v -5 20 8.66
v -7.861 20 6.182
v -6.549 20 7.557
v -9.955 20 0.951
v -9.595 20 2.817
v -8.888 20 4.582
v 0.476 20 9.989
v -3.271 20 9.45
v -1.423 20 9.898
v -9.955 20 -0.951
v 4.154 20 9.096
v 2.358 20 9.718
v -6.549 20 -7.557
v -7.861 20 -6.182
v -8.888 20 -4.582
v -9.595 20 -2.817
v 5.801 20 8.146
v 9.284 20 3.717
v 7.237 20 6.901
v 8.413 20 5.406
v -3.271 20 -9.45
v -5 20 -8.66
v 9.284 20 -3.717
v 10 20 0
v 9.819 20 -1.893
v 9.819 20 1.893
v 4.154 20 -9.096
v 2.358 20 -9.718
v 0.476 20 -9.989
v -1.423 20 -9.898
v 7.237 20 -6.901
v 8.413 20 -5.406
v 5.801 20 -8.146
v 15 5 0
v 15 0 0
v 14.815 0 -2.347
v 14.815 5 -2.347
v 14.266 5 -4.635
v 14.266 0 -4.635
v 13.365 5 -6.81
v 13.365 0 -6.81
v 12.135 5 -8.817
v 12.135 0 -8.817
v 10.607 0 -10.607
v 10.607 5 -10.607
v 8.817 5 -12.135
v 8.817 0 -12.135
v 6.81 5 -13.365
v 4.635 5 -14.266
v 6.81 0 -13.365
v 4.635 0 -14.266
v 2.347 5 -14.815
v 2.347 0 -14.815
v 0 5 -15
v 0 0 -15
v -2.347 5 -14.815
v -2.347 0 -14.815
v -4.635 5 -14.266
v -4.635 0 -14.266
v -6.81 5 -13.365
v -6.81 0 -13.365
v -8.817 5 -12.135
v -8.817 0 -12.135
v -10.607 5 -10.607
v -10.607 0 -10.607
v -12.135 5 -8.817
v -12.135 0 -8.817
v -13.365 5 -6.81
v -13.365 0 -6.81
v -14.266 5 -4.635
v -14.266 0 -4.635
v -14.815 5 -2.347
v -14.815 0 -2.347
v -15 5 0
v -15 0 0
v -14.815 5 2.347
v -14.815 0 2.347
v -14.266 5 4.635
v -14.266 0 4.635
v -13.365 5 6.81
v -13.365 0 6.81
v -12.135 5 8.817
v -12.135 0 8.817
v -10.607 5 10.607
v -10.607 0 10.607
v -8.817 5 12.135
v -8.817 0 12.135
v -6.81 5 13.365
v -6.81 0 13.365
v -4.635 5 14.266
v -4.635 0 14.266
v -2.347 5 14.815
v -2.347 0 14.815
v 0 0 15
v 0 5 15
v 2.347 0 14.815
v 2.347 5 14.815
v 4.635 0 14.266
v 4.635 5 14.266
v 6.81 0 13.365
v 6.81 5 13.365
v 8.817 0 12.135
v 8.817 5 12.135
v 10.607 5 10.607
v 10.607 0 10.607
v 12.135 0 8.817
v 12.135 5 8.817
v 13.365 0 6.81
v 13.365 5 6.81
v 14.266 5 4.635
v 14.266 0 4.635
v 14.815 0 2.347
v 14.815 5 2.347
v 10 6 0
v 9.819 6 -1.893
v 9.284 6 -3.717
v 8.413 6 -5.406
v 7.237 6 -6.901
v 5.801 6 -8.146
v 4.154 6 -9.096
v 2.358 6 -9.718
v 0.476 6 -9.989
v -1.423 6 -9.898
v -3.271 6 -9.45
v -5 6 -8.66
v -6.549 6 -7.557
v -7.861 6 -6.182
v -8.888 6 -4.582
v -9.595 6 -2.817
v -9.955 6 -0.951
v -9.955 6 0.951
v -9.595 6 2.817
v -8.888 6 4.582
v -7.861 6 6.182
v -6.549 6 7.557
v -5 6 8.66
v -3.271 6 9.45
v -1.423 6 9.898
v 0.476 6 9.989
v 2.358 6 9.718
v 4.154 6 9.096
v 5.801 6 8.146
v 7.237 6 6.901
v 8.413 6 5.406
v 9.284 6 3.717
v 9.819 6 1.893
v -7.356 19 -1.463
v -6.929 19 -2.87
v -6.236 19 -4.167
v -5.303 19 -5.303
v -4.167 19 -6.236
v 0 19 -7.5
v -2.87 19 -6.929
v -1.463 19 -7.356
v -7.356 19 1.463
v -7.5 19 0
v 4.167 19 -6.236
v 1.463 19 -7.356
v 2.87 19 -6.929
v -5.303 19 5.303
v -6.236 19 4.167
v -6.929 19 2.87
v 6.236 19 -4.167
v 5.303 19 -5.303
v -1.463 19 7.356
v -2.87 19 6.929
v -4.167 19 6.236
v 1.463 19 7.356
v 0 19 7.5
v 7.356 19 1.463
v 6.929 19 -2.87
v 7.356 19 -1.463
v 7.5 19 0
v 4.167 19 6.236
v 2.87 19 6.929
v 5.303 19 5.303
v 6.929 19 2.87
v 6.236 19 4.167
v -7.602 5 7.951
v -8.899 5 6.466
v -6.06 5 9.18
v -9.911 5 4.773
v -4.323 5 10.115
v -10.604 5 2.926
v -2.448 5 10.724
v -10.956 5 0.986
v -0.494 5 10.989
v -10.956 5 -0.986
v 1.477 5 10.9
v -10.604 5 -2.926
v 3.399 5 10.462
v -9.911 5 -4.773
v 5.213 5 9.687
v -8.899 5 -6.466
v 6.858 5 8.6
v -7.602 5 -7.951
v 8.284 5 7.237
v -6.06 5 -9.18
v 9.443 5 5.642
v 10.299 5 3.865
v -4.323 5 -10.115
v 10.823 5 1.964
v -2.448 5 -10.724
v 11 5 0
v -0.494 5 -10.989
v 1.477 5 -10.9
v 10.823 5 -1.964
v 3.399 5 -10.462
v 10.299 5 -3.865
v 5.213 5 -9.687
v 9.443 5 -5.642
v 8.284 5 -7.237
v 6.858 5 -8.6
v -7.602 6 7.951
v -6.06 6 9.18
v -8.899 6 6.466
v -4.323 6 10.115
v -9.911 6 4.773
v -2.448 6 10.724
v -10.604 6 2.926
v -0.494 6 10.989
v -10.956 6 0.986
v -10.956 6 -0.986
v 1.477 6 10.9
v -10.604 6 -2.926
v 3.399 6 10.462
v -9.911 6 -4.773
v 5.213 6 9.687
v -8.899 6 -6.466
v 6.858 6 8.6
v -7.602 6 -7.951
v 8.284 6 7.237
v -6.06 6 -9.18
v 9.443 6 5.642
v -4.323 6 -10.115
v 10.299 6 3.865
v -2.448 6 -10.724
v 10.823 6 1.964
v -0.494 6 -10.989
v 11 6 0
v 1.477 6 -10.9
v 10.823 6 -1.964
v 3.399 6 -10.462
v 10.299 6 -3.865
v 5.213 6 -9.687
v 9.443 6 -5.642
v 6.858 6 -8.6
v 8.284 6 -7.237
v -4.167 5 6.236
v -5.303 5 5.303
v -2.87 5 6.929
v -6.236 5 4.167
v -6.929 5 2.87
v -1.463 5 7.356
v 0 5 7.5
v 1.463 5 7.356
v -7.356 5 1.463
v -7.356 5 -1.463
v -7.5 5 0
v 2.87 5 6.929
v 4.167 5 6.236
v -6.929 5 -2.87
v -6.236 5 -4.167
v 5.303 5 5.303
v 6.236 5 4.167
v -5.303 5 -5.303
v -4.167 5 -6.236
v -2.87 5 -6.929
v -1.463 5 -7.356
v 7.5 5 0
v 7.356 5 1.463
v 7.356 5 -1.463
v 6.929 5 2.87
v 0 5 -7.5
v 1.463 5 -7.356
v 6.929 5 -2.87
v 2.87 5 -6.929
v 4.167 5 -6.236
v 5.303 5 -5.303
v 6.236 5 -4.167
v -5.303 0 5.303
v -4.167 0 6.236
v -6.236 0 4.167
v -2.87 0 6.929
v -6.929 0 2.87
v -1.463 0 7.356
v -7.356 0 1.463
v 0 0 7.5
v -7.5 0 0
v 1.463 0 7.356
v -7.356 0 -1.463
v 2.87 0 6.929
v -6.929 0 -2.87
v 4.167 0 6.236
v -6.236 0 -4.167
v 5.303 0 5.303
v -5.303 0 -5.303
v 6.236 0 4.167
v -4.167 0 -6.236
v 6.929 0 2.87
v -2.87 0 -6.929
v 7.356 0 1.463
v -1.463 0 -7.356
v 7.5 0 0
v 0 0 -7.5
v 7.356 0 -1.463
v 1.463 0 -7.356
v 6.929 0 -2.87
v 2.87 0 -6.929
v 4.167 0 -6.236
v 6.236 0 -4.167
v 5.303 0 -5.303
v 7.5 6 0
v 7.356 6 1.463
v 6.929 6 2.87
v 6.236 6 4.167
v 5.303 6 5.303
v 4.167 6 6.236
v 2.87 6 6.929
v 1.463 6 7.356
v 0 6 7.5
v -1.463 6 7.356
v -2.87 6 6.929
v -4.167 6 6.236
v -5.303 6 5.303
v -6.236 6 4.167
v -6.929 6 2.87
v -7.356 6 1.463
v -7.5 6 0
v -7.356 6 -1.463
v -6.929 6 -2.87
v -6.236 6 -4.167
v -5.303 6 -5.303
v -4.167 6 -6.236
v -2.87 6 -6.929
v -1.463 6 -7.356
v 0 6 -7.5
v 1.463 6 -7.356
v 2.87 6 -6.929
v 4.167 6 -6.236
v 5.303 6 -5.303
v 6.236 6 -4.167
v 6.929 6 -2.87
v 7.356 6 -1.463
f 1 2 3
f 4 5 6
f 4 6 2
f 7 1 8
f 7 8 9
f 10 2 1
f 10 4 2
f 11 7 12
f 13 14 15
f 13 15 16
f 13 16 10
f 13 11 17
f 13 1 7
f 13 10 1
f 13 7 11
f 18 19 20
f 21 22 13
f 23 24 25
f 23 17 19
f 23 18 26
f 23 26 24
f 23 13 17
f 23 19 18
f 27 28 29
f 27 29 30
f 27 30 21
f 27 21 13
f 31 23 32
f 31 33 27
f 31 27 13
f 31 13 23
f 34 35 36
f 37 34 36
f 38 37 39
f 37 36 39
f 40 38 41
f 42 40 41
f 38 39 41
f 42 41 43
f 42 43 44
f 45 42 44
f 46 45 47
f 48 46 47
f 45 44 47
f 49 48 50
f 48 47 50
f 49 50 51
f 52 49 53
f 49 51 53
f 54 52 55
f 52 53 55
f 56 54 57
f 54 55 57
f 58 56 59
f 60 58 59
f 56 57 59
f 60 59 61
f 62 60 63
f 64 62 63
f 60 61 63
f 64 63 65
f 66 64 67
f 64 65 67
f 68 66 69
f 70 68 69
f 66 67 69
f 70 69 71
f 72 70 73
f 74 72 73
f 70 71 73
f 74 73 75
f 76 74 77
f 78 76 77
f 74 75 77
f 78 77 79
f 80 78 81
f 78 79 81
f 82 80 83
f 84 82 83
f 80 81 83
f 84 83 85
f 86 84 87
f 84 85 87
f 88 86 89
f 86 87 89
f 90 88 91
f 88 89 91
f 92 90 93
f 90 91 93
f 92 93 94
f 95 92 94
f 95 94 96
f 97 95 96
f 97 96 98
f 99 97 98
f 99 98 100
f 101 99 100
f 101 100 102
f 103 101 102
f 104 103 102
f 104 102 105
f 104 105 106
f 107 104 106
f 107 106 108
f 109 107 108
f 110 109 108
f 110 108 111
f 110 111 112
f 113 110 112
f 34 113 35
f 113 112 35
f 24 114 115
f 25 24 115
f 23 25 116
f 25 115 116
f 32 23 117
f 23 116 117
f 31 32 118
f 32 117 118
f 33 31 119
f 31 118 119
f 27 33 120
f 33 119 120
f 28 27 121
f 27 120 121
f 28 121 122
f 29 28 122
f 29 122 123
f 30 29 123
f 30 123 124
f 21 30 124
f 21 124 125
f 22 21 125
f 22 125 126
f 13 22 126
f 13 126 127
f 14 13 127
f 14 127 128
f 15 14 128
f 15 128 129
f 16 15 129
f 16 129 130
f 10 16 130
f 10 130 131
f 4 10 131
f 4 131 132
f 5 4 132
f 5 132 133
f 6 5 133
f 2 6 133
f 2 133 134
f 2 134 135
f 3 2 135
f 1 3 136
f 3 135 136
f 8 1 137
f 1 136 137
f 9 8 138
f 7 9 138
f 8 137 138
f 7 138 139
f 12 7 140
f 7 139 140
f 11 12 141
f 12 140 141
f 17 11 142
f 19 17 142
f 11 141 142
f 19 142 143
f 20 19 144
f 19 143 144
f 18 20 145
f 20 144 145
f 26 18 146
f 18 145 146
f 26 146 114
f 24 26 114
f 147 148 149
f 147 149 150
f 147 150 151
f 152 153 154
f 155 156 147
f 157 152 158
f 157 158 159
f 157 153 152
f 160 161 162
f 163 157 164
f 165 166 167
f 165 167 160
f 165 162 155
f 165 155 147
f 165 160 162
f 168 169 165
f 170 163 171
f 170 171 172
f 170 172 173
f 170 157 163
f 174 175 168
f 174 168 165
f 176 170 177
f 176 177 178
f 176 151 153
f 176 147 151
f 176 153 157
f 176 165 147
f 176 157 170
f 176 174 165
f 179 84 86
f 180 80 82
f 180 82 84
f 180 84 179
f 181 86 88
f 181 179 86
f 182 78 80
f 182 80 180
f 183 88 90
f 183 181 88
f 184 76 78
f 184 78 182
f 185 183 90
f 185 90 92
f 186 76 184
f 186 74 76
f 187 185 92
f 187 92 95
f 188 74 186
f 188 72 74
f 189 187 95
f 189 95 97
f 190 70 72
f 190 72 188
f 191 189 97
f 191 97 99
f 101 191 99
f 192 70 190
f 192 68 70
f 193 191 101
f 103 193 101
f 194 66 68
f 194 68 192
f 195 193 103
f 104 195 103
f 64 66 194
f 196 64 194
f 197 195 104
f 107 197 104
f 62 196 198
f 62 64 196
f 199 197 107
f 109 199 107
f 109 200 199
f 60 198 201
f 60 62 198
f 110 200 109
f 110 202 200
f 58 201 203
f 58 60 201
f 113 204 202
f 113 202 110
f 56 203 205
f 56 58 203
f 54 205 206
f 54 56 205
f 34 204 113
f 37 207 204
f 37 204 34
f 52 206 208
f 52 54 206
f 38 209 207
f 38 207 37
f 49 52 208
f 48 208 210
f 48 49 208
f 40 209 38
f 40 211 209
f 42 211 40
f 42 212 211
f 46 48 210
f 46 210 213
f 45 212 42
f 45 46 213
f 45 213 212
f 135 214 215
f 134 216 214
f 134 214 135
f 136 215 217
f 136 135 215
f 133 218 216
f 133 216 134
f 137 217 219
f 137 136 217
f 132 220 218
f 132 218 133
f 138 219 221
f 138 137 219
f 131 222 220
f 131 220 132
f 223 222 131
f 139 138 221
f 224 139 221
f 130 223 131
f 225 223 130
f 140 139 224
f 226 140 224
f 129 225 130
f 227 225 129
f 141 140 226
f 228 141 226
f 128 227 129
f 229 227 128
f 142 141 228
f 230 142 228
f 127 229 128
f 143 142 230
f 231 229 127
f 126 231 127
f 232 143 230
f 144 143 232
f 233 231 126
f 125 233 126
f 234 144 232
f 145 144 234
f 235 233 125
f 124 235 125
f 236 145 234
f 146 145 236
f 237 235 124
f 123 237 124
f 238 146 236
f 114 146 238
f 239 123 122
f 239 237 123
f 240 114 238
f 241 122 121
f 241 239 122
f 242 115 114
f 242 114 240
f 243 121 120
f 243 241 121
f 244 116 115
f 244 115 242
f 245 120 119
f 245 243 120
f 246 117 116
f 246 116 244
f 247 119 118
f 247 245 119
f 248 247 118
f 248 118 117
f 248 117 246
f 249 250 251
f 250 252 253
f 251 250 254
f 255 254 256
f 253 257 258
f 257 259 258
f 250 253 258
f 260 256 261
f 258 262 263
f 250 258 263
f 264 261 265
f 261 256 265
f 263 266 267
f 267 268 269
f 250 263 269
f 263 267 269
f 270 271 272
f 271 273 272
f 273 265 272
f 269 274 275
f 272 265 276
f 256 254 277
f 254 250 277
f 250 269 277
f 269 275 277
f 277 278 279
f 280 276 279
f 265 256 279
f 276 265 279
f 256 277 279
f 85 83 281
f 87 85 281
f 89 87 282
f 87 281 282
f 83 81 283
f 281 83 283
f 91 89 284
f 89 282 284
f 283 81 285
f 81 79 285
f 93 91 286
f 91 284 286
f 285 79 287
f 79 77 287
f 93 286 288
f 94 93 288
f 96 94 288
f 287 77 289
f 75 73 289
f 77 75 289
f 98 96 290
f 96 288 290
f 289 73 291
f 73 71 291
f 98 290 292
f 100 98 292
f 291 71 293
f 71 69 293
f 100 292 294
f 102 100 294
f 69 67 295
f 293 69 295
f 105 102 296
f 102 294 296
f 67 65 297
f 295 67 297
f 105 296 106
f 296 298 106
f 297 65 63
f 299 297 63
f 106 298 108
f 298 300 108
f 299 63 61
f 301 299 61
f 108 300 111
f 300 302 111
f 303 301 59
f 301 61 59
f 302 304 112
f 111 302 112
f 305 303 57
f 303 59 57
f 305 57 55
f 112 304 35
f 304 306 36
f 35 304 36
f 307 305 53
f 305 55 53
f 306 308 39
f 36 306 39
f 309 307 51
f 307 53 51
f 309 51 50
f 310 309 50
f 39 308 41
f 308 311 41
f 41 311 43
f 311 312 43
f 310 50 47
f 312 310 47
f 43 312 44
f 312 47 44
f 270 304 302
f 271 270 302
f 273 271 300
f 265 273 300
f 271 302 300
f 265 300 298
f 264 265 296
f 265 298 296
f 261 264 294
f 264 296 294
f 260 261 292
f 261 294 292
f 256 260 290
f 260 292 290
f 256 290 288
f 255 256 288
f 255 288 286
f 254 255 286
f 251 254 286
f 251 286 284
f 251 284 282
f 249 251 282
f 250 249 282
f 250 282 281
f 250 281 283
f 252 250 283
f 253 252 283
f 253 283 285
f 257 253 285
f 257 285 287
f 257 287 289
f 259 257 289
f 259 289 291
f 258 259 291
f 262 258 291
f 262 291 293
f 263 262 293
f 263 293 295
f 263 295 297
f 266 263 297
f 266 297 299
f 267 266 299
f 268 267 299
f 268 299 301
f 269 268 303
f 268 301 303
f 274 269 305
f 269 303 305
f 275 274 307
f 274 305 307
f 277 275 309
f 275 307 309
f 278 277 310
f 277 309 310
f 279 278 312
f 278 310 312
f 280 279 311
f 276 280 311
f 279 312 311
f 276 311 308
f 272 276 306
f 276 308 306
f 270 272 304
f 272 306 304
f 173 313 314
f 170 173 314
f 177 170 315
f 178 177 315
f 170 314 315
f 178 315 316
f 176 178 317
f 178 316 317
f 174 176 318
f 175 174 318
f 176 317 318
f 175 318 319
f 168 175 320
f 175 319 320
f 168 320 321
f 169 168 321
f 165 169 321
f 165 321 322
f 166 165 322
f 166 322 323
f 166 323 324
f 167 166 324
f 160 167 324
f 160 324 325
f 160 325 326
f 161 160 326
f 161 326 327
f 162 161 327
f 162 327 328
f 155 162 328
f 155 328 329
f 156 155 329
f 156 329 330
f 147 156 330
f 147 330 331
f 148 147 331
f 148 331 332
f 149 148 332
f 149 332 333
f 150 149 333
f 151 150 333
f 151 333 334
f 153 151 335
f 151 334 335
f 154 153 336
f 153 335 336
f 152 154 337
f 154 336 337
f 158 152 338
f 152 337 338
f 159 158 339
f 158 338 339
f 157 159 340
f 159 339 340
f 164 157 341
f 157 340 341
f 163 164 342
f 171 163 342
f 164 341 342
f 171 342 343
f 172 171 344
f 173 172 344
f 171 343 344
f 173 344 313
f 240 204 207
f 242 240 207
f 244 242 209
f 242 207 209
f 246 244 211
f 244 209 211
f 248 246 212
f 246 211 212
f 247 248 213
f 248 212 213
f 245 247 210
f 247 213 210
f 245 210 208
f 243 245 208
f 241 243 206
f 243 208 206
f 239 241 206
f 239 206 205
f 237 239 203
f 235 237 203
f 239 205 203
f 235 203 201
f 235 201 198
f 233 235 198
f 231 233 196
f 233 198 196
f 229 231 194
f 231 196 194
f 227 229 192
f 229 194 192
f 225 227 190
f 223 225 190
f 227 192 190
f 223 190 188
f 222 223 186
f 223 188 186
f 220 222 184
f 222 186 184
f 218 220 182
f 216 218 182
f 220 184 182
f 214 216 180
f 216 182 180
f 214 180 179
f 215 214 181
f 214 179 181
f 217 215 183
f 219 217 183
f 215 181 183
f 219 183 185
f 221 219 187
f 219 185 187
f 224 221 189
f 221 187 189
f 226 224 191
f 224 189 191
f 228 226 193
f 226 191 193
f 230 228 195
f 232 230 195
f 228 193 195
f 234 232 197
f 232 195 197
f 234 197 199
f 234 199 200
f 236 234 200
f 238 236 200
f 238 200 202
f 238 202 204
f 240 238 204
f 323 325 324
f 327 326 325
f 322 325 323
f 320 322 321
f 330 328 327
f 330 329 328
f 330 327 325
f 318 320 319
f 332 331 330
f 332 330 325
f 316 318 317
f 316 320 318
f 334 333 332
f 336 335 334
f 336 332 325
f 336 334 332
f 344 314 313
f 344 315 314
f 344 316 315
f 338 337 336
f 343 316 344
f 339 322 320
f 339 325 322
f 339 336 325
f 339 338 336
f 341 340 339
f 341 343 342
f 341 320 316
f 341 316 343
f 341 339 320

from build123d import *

# Parameters (mm, degrees)
SKETCH1_R           = 15
BOSS_EXTRUDE1_DEPTH = 5
SKETCH2_R           = 10
BOSS_EXTRUDE2_DEPTH = 15
SKETCH3_R           = 7.5
CUT_EXTRUDE1_DEPTH  = 19
SKETCH5_R           = 11
BOSS_EXTRUDE3_DEPTH = 1


with BuildPart() as part:
    # Sketch1 → Boss-Extrude1 (new body)
    with BuildSketch(Plane(origin=(0, 0, 0), x_dir=(1, 0, 0), z_dir=(0, 1, 0))):
        Circle(SKETCH1_R)
    extrude(amount=BOSS_EXTRUDE1_DEPTH)

    # Sketch2 → Boss-Extrude2 (add)
    with BuildSketch(Plane(origin=(0, 5, 0), x_dir=(1, 0, 0), z_dir=(0, 1, 0))):
        Circle(SKETCH2_R)
    extrude(amount=BOSS_EXTRUDE2_DEPTH)

    # Sketch3 → Cut-Extrude1 (cut)
    with BuildSketch(Plane.XZ):
        Circle(SKETCH3_R)
    extrude(amount=-CUT_EXTRUDE1_DEPTH, mode=Mode.SUBTRACT)

    # Sketch5 → Boss-Extrude3 (add)
    with BuildSketch(Plane(origin=(0, 5, 0), x_dir=(1, 0, 0), z_dir=(0, 1, 0))):
        Circle(SKETCH5_R)
    extrude(amount=BOSS_EXTRUDE3_DEPTH)


solid = part.part
